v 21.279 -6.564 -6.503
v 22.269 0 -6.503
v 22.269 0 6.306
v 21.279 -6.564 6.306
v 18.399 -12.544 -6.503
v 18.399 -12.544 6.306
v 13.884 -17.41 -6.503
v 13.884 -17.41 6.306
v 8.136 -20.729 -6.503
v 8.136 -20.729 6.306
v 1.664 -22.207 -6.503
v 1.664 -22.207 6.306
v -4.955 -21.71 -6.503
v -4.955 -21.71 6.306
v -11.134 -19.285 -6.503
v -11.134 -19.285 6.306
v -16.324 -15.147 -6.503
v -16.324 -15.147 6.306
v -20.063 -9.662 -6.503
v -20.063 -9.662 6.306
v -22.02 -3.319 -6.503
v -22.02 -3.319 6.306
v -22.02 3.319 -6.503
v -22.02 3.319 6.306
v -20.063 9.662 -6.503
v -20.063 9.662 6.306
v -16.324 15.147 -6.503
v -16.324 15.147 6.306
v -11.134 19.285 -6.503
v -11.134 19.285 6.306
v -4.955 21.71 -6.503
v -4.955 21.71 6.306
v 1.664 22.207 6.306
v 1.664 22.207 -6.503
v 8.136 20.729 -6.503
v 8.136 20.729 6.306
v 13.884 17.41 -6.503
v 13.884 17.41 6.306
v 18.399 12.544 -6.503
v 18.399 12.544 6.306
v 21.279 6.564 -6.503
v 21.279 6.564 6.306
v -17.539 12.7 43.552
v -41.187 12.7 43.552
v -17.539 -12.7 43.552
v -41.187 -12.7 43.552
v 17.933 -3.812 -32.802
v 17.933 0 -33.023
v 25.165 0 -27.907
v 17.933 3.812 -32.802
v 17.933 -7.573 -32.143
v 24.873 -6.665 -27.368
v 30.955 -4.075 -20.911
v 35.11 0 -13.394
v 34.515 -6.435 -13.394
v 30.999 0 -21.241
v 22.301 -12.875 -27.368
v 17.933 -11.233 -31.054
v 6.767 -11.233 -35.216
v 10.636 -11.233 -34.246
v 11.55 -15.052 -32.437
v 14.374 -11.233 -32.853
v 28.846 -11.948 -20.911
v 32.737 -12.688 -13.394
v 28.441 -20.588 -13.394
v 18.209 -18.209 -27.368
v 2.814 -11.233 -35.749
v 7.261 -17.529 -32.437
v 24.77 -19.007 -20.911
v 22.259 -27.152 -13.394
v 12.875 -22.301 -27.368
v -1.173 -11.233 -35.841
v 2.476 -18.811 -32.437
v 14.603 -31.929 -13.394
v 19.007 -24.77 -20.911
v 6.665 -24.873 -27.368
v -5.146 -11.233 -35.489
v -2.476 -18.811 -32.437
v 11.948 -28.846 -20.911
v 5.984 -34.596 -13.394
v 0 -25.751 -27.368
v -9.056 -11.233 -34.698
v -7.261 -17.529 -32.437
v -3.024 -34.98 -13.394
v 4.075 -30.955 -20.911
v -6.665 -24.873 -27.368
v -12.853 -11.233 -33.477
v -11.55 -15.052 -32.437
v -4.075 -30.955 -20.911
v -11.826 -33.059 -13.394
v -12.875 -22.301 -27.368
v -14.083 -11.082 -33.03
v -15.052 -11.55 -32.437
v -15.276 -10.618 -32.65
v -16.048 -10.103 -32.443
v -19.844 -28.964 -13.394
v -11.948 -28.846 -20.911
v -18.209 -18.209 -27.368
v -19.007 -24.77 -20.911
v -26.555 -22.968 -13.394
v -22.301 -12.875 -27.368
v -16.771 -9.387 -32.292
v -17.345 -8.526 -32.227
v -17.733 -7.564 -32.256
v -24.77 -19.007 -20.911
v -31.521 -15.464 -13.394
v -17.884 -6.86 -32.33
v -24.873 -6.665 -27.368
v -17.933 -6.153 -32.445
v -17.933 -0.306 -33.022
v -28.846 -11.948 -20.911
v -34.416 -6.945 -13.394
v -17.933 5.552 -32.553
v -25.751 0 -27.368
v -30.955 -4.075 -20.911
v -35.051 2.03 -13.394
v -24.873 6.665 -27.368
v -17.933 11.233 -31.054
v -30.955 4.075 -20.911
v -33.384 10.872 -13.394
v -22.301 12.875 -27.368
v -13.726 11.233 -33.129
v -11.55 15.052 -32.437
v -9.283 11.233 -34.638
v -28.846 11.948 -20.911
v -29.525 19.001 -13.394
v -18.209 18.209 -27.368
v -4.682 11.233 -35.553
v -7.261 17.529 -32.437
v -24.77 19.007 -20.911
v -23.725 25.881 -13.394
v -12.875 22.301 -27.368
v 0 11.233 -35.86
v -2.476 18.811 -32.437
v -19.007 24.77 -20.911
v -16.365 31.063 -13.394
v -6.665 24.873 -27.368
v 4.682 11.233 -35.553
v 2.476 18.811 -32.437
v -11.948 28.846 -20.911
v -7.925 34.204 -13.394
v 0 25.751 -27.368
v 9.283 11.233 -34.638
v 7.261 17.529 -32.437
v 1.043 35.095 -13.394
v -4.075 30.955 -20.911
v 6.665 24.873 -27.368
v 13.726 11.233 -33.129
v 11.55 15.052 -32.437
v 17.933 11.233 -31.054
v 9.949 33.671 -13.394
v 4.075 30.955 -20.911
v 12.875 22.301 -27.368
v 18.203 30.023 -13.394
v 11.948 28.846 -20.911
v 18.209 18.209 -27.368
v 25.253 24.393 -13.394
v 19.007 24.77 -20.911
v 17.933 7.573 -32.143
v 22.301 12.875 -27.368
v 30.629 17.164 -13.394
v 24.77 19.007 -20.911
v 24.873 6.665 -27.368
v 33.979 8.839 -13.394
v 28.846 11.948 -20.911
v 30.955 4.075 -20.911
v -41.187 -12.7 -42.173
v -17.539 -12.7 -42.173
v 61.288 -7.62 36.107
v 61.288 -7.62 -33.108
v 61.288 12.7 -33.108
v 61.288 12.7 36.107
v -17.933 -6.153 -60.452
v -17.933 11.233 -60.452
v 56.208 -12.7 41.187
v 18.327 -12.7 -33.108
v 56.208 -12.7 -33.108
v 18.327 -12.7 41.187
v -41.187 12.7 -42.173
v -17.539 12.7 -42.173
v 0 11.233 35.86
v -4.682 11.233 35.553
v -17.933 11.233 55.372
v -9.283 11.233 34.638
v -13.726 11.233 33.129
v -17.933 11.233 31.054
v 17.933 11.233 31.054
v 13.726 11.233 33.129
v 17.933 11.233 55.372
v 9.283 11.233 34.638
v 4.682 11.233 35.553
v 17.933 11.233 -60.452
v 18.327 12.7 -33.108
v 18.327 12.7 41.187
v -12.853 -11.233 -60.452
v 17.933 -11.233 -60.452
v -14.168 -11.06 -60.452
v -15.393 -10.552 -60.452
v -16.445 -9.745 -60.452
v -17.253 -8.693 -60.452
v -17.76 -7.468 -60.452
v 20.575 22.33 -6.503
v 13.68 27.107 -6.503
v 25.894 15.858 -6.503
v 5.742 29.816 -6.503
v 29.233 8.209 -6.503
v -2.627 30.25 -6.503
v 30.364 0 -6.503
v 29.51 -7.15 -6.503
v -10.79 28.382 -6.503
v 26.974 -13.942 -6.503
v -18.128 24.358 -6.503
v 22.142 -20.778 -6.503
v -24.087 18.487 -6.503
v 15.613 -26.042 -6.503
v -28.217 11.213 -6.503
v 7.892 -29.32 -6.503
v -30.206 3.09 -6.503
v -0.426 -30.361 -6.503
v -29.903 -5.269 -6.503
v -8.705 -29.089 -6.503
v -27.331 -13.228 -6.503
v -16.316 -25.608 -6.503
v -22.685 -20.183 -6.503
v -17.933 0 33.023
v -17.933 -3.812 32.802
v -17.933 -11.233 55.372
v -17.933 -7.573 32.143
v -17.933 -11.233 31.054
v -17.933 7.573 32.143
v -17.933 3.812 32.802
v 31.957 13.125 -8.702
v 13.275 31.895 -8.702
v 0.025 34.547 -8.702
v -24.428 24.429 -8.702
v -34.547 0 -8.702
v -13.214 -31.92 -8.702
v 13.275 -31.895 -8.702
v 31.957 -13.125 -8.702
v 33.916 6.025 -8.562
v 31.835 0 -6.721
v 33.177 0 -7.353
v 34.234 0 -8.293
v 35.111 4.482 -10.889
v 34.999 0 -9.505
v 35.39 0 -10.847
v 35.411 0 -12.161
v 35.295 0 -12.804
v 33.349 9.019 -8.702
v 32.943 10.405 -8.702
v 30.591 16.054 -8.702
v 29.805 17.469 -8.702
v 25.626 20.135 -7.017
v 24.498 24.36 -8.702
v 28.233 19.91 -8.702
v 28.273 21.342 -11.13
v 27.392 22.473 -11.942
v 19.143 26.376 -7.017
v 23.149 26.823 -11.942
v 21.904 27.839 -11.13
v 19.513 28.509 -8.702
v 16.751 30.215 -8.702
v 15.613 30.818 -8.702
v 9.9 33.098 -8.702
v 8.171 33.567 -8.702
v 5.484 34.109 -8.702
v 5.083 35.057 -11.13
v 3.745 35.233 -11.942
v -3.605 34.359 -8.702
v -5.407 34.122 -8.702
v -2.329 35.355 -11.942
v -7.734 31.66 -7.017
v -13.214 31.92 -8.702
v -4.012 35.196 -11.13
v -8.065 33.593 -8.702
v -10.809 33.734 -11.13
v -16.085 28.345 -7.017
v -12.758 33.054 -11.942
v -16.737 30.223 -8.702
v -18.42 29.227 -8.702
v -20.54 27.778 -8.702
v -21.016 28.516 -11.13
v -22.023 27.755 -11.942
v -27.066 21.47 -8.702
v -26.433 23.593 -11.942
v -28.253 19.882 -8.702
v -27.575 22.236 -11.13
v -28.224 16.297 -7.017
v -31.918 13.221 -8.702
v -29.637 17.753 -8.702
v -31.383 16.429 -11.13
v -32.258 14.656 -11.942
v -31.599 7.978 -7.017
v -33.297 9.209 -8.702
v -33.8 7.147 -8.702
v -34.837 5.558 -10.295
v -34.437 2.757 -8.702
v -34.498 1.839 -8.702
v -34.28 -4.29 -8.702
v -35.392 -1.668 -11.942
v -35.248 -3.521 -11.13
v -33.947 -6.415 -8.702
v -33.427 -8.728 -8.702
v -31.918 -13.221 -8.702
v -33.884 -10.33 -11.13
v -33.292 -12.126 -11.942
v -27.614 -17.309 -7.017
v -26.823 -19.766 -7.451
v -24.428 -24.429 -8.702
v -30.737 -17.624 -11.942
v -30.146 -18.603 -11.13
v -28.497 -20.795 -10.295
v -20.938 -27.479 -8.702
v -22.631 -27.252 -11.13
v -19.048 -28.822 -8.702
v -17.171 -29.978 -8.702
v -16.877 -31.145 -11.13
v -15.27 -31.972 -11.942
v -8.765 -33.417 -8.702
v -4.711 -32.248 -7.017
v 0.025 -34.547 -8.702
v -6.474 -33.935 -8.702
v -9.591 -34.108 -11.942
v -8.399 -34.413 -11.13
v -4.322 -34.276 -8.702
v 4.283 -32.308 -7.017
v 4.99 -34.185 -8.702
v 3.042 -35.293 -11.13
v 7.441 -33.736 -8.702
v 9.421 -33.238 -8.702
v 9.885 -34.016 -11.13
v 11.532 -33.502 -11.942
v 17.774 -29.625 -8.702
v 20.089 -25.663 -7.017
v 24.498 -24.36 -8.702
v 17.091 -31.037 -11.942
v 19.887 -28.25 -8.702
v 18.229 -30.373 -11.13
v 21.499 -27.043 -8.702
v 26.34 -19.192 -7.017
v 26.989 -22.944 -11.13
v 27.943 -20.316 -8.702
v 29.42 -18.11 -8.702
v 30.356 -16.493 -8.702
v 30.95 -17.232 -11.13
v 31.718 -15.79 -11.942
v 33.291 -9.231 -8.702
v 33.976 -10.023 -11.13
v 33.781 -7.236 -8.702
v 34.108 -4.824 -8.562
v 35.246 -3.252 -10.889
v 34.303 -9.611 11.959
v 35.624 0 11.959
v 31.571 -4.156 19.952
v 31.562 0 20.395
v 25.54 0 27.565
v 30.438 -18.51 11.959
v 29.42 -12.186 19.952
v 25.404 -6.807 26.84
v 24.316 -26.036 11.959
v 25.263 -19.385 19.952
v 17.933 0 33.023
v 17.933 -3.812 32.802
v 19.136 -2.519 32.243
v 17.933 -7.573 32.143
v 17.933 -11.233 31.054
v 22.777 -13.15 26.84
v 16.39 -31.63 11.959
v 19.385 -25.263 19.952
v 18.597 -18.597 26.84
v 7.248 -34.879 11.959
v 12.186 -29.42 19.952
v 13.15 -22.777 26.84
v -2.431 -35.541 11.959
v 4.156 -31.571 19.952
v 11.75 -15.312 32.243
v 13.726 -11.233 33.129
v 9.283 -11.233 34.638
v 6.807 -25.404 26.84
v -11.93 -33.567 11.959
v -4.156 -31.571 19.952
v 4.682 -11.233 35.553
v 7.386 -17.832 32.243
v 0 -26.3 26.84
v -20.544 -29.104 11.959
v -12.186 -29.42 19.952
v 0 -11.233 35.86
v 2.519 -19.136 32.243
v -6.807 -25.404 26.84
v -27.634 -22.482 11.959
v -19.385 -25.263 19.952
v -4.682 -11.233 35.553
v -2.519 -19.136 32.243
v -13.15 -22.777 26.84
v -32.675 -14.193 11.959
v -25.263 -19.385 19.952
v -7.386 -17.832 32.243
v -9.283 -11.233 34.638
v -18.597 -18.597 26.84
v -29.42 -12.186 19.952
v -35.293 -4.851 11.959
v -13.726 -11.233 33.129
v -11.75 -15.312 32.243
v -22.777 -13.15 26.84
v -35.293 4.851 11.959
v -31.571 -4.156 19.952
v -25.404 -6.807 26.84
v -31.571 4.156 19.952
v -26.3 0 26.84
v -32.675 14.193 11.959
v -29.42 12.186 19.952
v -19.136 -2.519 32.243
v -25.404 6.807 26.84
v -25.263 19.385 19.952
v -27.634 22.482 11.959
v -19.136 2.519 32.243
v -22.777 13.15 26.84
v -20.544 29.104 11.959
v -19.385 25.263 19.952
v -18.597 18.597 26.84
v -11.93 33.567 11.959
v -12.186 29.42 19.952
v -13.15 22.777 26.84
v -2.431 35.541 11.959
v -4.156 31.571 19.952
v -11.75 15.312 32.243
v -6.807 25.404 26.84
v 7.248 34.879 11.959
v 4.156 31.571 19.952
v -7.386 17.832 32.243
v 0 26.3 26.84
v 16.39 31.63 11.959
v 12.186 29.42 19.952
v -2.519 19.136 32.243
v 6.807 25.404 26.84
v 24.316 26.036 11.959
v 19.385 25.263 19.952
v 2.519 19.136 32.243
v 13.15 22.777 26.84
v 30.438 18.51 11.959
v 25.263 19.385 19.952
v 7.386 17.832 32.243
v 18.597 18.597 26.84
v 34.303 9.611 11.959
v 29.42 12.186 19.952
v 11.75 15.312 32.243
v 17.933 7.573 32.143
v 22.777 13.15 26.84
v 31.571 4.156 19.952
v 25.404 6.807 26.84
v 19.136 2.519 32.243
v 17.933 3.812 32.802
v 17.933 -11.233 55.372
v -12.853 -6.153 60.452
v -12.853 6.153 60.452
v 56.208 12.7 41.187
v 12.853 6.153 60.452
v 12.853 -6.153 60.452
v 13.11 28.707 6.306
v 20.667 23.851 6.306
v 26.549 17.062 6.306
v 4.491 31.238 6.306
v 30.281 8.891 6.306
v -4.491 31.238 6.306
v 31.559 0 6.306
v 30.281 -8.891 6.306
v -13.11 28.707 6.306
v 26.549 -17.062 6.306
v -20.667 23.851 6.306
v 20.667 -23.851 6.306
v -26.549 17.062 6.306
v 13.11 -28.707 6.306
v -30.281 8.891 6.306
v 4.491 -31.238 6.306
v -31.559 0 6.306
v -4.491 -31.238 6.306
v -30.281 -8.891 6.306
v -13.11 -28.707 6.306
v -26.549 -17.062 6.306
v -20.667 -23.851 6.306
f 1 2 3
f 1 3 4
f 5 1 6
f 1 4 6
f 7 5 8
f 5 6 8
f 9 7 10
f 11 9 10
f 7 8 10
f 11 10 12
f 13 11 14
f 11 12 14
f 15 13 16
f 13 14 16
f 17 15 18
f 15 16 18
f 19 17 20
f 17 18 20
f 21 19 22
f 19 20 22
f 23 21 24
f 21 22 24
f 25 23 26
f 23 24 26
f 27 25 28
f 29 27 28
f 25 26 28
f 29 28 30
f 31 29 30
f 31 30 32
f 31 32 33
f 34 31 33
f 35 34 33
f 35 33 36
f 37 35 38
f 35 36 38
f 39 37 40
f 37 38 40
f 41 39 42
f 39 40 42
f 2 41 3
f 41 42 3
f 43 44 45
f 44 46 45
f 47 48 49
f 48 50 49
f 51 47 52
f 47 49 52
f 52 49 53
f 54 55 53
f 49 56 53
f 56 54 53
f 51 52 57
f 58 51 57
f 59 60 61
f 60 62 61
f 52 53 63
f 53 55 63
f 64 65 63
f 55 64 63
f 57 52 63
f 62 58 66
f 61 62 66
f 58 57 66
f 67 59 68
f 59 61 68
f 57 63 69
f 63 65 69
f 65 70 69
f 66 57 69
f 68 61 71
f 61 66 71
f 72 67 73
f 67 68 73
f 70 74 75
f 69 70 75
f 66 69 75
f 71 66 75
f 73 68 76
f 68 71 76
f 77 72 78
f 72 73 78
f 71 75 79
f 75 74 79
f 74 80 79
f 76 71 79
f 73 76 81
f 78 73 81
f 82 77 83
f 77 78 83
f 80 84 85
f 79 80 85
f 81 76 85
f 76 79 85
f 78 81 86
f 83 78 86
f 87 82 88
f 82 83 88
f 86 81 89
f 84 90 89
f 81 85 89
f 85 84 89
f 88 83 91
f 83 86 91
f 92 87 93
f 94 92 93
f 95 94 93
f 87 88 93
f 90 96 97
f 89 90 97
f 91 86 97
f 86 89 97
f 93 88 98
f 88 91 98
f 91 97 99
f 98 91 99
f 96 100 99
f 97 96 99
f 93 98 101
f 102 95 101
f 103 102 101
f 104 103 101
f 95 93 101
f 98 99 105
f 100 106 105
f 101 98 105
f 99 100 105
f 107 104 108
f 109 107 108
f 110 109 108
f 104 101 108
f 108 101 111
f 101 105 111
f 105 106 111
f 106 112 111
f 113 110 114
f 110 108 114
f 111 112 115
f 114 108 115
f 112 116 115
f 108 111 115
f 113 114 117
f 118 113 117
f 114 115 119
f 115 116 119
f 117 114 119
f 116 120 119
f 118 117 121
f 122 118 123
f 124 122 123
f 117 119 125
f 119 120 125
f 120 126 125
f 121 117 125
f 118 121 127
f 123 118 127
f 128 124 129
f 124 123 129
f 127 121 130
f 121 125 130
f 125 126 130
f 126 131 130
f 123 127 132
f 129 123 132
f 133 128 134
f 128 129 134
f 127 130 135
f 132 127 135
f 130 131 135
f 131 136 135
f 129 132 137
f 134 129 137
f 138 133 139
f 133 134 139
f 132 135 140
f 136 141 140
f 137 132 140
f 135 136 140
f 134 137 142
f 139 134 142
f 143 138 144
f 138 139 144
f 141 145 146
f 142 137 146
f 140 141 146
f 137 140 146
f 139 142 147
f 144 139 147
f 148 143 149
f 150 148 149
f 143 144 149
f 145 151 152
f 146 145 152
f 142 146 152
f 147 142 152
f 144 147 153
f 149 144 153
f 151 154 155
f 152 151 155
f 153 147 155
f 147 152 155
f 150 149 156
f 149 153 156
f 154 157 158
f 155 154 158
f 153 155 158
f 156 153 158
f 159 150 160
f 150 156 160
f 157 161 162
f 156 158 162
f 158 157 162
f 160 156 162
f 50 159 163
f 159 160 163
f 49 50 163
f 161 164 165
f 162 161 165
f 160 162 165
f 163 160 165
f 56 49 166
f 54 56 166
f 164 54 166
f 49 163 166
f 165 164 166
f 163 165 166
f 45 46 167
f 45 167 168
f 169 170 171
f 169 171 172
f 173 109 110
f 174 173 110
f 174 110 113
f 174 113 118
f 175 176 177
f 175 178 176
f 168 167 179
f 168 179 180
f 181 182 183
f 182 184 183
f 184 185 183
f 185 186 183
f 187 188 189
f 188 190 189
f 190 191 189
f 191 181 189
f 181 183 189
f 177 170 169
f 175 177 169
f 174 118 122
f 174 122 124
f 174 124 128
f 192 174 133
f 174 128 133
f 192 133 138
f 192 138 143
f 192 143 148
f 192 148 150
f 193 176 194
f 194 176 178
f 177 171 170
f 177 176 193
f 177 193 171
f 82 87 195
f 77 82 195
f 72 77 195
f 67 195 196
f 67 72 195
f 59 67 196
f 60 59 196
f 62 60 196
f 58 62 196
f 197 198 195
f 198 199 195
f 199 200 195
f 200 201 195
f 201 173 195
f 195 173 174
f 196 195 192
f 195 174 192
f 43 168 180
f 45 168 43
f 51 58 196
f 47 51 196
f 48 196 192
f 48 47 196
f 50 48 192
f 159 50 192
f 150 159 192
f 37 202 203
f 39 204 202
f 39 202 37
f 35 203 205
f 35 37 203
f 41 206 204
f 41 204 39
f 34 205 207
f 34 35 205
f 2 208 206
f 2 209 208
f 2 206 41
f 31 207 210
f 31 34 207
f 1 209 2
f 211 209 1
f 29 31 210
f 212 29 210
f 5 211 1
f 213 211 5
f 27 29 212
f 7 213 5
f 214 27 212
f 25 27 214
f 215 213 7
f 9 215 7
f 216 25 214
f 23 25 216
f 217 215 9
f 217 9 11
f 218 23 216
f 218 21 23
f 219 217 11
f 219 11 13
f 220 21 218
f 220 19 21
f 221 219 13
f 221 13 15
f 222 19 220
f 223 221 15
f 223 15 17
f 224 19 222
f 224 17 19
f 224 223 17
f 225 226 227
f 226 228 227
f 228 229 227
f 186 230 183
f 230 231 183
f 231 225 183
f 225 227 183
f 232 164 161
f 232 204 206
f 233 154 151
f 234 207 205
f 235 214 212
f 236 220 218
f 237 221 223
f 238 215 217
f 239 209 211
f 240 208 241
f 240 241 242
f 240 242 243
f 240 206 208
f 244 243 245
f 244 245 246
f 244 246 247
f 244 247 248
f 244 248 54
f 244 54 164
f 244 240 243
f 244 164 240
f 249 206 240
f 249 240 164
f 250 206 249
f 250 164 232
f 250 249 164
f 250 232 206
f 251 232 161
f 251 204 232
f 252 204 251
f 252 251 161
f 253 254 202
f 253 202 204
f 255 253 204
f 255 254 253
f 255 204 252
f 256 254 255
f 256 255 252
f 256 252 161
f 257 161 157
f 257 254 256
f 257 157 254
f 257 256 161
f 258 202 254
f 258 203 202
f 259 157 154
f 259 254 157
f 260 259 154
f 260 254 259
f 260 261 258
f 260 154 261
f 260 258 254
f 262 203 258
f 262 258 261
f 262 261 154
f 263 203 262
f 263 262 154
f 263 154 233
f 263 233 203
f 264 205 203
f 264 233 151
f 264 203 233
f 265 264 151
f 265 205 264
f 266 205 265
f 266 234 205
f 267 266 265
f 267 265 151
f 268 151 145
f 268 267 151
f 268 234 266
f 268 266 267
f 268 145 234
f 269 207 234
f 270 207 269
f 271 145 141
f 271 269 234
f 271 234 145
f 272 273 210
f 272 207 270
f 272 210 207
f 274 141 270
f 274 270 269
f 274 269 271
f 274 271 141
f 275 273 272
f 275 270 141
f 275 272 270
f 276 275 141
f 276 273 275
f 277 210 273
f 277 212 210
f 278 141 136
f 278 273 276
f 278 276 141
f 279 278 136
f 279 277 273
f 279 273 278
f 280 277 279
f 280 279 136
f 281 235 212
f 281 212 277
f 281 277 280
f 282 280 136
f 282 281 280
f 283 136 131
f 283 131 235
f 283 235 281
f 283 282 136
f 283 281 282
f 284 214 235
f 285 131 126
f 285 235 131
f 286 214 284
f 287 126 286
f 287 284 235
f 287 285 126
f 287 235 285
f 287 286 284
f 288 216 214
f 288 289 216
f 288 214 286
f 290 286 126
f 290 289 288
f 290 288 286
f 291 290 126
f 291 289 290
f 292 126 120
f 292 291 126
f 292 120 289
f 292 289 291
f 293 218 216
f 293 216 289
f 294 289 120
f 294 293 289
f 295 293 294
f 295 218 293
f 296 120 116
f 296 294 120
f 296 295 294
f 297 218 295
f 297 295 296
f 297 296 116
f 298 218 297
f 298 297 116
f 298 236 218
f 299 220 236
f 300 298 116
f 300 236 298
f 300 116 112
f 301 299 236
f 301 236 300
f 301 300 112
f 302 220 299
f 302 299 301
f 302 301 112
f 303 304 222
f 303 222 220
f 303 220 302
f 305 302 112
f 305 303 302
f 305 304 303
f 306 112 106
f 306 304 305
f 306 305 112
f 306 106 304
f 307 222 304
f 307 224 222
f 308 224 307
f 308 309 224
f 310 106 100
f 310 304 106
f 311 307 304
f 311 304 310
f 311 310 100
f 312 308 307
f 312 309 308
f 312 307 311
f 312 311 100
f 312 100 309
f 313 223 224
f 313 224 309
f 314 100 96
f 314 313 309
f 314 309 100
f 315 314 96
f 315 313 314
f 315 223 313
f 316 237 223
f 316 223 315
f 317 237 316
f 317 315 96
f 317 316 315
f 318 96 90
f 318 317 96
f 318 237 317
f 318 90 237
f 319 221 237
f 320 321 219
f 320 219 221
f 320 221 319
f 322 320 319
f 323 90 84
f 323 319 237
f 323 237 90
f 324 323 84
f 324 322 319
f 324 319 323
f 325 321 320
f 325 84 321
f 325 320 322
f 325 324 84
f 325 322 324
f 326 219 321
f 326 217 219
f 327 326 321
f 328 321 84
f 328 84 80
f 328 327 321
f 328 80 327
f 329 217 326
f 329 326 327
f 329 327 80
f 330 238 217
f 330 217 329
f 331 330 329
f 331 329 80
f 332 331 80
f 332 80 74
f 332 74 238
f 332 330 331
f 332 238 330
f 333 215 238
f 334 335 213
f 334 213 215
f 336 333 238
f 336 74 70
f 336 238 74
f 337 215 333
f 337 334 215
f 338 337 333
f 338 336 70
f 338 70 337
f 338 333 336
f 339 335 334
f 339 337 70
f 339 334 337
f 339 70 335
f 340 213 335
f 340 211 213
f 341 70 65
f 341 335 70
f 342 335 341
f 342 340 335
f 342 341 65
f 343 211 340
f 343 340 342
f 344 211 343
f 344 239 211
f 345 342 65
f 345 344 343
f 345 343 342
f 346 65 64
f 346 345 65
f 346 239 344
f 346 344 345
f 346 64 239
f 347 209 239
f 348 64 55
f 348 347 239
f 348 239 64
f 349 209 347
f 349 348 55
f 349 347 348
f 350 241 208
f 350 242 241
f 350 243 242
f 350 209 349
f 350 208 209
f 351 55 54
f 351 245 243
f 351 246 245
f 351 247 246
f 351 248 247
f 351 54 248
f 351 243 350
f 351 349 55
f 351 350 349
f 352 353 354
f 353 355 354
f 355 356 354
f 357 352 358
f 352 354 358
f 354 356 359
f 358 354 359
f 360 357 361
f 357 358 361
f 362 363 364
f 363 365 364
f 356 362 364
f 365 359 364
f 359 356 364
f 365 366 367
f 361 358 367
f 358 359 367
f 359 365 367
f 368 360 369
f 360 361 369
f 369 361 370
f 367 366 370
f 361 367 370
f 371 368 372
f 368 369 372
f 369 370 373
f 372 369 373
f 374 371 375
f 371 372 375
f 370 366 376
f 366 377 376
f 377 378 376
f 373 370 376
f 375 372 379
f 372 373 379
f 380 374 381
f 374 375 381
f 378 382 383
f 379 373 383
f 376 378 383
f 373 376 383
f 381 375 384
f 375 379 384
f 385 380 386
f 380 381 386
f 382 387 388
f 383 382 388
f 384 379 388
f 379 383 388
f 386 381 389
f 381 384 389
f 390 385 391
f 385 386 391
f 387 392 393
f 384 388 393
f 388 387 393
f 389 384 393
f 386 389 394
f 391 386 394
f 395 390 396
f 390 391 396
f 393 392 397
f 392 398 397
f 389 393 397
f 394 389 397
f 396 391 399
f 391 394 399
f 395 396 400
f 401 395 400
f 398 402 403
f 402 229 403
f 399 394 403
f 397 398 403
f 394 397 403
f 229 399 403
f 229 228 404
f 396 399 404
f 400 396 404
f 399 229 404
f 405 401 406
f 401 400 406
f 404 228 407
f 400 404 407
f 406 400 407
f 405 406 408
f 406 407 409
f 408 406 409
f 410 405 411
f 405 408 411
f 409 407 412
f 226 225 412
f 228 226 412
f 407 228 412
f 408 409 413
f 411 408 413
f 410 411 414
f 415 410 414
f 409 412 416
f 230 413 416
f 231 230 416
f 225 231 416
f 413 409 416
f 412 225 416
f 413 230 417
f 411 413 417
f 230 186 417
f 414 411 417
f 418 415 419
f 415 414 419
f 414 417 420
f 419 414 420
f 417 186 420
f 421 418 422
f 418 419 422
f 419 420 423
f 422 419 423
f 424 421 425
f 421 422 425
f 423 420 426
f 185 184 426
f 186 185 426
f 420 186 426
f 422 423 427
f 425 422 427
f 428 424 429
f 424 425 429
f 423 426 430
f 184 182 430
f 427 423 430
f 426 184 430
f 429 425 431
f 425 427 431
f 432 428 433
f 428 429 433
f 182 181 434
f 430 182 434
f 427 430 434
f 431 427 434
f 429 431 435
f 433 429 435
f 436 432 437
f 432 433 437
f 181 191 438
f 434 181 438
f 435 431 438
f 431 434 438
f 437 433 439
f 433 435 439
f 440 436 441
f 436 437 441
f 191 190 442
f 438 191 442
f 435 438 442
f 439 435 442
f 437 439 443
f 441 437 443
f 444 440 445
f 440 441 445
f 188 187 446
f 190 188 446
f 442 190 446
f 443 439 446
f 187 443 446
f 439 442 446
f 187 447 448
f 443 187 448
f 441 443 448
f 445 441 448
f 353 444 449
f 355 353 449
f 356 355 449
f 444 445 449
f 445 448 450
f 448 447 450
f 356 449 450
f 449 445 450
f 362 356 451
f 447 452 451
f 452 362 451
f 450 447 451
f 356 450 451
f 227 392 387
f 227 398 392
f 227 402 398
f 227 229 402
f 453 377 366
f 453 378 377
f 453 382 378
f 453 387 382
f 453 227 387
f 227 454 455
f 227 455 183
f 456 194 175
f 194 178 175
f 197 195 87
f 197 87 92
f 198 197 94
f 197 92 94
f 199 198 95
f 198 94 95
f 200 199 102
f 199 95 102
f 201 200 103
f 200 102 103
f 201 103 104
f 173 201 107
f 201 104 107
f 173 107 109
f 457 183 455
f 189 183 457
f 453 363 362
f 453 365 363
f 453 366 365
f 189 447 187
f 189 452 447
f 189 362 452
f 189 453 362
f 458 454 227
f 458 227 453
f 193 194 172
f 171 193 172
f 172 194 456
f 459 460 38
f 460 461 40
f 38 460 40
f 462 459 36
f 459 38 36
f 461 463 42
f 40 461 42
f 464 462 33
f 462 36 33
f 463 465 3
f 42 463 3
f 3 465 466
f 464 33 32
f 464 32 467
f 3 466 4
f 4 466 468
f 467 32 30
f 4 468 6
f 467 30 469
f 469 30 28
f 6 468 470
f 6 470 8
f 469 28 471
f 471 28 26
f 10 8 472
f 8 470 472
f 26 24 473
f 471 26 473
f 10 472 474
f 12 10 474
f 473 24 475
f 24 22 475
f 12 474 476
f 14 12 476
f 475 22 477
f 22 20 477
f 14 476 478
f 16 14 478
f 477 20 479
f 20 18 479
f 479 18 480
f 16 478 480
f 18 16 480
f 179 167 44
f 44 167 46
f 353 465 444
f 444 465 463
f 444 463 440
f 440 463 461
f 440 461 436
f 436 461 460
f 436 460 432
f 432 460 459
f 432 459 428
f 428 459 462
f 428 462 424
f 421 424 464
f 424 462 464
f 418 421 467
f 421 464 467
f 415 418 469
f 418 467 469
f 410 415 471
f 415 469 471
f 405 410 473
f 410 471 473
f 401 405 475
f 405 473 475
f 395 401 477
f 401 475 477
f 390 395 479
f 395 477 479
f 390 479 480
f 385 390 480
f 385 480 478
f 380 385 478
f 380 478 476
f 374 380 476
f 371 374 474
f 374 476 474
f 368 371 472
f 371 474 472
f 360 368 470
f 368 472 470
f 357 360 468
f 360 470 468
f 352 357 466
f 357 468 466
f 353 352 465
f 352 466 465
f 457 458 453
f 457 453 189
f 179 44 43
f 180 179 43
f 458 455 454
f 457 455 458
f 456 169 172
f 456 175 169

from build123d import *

# Parameters (mm, degrees)
F2_W        = 27.9908
F2_H        = 12.8094828688
F4_W        = 35.8665548265
F4_H        = 22.4658623338
F5_DEPTH    = 60.452
F6_SIZE     = 5.08
F7_T1_DEPTH = 48.5941614915
F8_SIZE     = 5.08
F9_SIZE     = 5.08
F11_R       = 5.08
F12_R       = 5.08
F13_W       = 23.6482750624
F13_H       = 85.7249982655
F14_DEPTH   = 12.7
F15_W       = 42.9610330611
F15_H       = 74.2949992418
F16_DEPTH   = 12.7
F17_SIZE    = 5.08
F18_SIZE    = 5.08


# Not quite as in the source:
# - a fillet or chamfer that OpenCascade refuses, or shapes differently, is made with other operations: its cross-section is extruded or revolved along the edge and cut away or added


with BuildPart() as f1:
    # F0 (on Front) → F1 (revolve)
    with BuildSketch(Plane.XZ):
        with BuildLine():
            Line((0, 37.5782152754), (0, -37.5782152754))
            ThreePointArc((0, -37.5782152754), (37.5782152754, 0), (0, 37.5782152754))
        make_face()
    revolve(axis=Axis((0, 0, 0), (0, 0, -1)))

    # F2 (on Front) → F3 (revolve, cut)
    with BuildSketch(Plane.XZ):
        with Locations((36.2641926143, -0.0985346269)):
            Rectangle(F2_W, F2_H)
    revolve(axis=Axis((0, 0, 0.5912072957), (0, 0, -1)), mode=Mode.SUBTRACT)

    # F4 (on Top) → F5 (join, symmetric)
    with BuildSketch(Plane.XY):
        Rectangle(F4_W, F4_H)
    extrude(amount=F5_DEPTH, both=True)

    # F6
    f6_edges = [f1.edges().sort_by_distance(p)[0] for p in [
        (17.933277, 0, 60.452),
    ]]
    chamfer(f6_edges, length=F6_SIZE)

    # F7: chamfer of 5.08 on 1 edges, made by hand

    # F7_s2 → F7_t1 (cut)
    with BuildSketch(Plane.XZ.offset(-24.2970807458)):
        Polygon((-12.8532774132, 60.452), (-17.9332774132, 55.372), (-17.9332774132, 60.452), align=None)
    extrude(amount=F7_T1_DEPTH, mode=Mode.SUBTRACT)

    # F8
    f8_edges = [f1.edges().sort_by_distance(p)[0] for p in [
        (0, -11.232931, 60.452),
    ]]
    chamfer(f8_edges, length=F8_SIZE)

    # F9
    f9_edges = [f1.edges().sort_by_distance(p)[0] for p in [
        (0, 11.232931, 60.452),
    ]]
    chamfer(f9_edges, length=F9_SIZE)

    # F10: chamfer of 5.08 on 1 edges, made by hand

    # F10_s1 → F10_t2 (revolve, cut)
    with BuildSketch(Plane.XZ):
        with BuildLine():
            Line((35.7430389368, 12.1242465057), (31.4404153436, 6.1412357976))
            Line((31.4404153436, 6.1412357976), (31.4404153436, 6.0396357976))
            ThreePointArc((31.4404153436, 6.0396357976), (34.2428560987, 6.2046068075), (37.0452968537, 6.2046068075))
            Line((37.0452968537, 6.2046068075), (37.1454560053, 6.3232568618))
            ThreePointArc((37.1454560053, 6.3232568618), (36.5270685447, 9.2488779166), (35.8393564224, 12.1565807287))
            Line((35.8393564224, 12.1565807287), (35.7430389368, 12.1242465057))
        make_face()
    revolve(axis=Axis((0, 0, 6.3062068075), (0, 0, 1)), mode=Mode.SUBTRACT)

    # F11
    f11_edges = [f1.edges().sort_by_distance(p)[0] for p in [
        (-37.01121, 0, -6.503276),
    ]]
    fillet(f11_edges, radius=F11_R)

    # F12
    f12_edges = [f1.edges().sort_by_distance(p)[0] for p in [
        (-17.933277, -11.232931, -45.752921),
    ]]
    fillet(f12_edges, radius=F12_R)


with BuildPart() as f14:
    # F13 (on Front) → F14 (new body, symmetric)
    with BuildSketch(Plane.XZ):
        with Locations((-29.3632755056, 0.6897393614)):
            Rectangle(F13_W, F13_H)
    extrude(amount=F14_DEPTH, both=True)


with BuildPart() as f16:
    # F15 (on Front) → F16 (new body, symmetric)
    with BuildSketch(Plane.XZ):
        with Locations((39.8079296574, 4.0399134159)):
            Rectangle(F15_W, F15_H)
    extrude(amount=F16_DEPTH, both=True)

    # F17
    f17_edges = [f16.edges().sort_by_distance(p)[0] for p in [
        (61.288446, 0, 41.187413),
    ]]
    chamfer(f17_edges, length=F17_SIZE)

    # F18
    f18_edges = [f16.edges().sort_by_distance(p)[0] for p in [
        (61.288446, -12.7, 1.499913),
    ]]
    chamfer(f18_edges, length=F18_SIZE)


solid = Compound([f1.part, f14.part, f16.part])
